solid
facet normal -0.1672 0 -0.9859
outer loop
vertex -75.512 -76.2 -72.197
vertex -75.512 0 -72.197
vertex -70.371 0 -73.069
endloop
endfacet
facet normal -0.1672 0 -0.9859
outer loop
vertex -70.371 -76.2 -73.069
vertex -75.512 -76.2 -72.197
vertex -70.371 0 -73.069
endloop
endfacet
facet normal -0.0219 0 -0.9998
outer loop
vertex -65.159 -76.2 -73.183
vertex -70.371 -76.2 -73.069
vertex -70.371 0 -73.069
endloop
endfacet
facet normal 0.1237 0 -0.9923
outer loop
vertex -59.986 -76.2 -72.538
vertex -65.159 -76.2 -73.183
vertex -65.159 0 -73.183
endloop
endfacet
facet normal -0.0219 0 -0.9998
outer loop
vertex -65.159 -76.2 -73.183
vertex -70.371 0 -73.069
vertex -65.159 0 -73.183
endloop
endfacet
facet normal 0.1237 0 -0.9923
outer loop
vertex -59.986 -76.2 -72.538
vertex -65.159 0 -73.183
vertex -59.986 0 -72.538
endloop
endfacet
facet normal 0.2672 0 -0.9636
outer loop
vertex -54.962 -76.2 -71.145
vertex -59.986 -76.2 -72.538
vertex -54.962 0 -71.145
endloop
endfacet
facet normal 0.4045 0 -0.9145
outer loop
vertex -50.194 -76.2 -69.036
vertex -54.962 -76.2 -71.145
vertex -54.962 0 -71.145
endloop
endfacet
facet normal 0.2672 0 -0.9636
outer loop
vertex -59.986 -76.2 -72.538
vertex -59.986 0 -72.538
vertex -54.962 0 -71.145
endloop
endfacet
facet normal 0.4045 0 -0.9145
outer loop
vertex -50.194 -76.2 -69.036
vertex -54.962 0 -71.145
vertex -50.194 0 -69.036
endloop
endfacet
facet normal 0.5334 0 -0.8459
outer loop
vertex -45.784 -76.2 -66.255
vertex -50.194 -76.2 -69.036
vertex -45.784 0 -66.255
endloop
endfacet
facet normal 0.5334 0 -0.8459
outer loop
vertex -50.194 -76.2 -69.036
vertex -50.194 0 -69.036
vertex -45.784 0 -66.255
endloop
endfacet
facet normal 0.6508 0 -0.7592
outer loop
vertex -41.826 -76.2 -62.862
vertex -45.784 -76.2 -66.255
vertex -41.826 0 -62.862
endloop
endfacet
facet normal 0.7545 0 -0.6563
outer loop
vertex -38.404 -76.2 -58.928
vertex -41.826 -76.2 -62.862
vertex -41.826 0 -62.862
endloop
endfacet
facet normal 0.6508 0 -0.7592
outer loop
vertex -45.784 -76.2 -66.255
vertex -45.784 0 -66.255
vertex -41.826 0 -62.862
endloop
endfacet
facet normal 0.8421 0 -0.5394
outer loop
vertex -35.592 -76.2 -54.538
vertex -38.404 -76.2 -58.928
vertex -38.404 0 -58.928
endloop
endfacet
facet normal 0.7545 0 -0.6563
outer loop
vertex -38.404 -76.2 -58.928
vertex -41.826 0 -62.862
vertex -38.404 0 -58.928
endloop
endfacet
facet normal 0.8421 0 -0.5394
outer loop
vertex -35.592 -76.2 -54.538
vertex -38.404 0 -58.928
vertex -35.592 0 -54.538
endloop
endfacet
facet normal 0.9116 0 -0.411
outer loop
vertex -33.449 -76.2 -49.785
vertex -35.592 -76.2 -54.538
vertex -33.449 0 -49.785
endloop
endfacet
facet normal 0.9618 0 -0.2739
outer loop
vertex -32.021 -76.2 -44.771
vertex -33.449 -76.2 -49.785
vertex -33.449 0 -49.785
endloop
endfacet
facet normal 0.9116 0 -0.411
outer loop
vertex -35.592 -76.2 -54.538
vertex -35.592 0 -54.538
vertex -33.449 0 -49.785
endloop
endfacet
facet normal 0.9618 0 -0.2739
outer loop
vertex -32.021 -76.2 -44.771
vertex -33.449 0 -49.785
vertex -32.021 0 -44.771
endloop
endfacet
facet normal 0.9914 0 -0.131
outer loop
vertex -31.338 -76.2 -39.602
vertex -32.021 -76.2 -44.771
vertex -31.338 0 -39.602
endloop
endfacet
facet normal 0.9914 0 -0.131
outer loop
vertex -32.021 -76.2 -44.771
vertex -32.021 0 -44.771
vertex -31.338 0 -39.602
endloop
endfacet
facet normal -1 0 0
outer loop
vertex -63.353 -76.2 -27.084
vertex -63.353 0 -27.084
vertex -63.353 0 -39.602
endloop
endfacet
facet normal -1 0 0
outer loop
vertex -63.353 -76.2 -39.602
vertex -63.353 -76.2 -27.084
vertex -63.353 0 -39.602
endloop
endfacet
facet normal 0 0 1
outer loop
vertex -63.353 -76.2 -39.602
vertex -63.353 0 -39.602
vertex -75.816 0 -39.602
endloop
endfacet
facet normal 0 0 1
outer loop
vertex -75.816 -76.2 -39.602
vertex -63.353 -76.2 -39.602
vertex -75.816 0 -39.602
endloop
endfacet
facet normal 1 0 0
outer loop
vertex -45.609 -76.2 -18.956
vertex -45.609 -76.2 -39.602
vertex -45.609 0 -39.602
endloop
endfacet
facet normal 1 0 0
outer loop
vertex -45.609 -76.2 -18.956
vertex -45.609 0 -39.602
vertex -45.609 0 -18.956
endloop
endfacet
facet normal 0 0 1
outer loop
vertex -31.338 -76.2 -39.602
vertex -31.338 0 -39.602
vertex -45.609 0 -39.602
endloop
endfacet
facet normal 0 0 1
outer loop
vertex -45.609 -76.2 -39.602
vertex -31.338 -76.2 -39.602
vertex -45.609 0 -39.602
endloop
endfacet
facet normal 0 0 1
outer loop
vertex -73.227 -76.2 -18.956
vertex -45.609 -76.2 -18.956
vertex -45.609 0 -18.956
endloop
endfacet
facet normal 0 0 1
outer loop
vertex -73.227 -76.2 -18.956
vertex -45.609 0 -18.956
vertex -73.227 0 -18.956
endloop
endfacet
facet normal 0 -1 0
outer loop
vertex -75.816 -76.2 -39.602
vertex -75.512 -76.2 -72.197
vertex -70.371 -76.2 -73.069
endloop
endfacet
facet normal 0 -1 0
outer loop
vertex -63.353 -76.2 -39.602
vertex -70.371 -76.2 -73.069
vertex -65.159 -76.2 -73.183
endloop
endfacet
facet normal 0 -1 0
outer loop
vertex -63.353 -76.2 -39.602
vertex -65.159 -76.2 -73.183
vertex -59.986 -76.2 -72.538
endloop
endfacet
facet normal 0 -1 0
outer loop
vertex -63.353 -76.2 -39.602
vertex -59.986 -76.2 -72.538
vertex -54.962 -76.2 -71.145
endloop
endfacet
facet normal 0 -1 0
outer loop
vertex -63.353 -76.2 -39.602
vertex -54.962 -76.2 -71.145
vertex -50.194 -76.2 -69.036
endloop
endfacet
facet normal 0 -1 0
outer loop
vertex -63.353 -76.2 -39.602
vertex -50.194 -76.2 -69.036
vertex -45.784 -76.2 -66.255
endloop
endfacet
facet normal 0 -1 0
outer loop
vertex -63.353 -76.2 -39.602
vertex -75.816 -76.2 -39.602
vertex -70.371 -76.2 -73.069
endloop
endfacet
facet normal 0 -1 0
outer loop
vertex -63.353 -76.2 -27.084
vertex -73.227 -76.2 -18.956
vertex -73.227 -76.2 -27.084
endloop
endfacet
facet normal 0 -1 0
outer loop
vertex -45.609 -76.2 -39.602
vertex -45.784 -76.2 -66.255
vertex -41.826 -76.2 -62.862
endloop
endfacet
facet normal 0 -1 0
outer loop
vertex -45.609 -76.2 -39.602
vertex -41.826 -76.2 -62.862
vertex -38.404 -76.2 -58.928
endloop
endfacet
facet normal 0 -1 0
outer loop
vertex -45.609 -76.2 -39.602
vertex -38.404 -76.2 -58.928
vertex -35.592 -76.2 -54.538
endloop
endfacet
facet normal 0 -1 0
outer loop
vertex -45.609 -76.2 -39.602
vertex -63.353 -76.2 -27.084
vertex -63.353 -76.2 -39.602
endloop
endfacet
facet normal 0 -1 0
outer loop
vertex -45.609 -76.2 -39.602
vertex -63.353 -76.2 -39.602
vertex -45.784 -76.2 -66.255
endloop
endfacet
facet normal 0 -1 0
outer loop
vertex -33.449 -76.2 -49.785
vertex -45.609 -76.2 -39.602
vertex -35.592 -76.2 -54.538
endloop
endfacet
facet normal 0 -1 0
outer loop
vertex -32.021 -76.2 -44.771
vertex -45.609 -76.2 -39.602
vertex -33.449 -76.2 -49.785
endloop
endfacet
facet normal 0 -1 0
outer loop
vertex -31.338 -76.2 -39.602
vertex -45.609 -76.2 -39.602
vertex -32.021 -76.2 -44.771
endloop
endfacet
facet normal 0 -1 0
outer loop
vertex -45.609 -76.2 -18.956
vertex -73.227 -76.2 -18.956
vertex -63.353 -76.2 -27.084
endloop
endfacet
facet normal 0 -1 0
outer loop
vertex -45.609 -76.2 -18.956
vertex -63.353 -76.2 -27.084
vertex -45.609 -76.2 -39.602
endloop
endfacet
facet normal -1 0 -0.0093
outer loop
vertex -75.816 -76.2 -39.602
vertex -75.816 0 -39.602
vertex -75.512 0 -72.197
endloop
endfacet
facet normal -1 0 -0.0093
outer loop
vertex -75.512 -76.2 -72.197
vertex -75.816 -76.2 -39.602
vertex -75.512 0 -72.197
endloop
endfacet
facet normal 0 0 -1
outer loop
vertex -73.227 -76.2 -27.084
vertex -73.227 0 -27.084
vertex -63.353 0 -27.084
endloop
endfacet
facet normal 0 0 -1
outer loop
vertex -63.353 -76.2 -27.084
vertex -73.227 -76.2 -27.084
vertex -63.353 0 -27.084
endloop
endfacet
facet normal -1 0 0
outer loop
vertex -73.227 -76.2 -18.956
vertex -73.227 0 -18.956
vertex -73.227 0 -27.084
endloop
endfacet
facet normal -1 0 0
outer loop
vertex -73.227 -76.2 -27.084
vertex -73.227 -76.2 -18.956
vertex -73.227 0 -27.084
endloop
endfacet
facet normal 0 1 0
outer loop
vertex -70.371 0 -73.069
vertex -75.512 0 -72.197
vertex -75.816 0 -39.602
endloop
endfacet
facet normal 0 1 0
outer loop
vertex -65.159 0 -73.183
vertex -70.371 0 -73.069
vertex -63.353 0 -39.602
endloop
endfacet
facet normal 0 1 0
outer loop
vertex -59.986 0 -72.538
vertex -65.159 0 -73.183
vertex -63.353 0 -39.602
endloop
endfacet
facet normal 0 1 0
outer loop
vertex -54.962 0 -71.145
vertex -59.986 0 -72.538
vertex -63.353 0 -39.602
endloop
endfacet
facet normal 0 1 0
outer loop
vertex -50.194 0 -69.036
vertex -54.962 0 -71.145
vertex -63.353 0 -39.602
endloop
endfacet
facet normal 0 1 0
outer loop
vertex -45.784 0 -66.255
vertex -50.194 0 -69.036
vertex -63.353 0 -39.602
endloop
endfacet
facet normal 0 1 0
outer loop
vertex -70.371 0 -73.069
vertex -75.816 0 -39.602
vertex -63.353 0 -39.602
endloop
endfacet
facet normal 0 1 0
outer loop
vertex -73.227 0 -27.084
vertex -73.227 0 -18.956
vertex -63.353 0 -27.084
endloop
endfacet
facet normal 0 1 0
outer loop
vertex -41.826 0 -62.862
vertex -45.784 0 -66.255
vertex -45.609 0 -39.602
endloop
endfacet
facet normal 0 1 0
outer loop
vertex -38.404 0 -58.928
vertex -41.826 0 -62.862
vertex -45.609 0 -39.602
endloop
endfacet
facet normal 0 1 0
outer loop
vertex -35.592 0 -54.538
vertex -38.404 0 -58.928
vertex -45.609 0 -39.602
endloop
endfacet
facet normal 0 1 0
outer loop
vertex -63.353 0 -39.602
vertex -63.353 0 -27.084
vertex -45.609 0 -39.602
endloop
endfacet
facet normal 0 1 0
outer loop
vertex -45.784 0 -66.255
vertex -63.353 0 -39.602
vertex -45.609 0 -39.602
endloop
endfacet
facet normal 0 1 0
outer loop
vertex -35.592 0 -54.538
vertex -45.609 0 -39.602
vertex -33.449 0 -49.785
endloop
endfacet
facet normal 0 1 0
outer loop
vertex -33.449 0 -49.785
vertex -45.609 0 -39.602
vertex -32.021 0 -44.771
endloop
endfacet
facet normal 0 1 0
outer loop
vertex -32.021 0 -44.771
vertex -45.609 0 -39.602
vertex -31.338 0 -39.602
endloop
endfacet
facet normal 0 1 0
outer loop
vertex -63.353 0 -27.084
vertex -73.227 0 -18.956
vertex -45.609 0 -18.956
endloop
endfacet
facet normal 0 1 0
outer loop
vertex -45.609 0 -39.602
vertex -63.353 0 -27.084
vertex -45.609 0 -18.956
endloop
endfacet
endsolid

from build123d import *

# Parameters (mm, degrees)
F1_DEPTH = 76.2


with BuildPart() as f1:
    # F0 (on Front) → F1 (new body)
    with BuildSketch(Plane.XZ):
        with BuildLine():
            Line((-75.81626, -39.602265), (-75.511565, -72.197098))
            ThreePointArc((-75.511565, -72.197098), (-45.783731, -66.25503), (-31.337889, -39.602265))
            Line((-31.337889, -39.602265), (-45.608908, -39.602265))
            Line((-45.608908, -39.602265), (-63.353062, -39.602265))
            Line((-63.353062, -39.602265), (-75.81626, -39.602265))
        make_face()
        Polygon((-63.353062, -39.602265), (-45.608908, -39.602265), (-45.608908, -18.955742), (-63.353062, -18.955742), (-73.227495, -18.955742), (-73.227495, -27.083755), (-63.353062, -27.083755), align=None)
    extrude(amount=F1_DEPTH)


solid = f1.part
